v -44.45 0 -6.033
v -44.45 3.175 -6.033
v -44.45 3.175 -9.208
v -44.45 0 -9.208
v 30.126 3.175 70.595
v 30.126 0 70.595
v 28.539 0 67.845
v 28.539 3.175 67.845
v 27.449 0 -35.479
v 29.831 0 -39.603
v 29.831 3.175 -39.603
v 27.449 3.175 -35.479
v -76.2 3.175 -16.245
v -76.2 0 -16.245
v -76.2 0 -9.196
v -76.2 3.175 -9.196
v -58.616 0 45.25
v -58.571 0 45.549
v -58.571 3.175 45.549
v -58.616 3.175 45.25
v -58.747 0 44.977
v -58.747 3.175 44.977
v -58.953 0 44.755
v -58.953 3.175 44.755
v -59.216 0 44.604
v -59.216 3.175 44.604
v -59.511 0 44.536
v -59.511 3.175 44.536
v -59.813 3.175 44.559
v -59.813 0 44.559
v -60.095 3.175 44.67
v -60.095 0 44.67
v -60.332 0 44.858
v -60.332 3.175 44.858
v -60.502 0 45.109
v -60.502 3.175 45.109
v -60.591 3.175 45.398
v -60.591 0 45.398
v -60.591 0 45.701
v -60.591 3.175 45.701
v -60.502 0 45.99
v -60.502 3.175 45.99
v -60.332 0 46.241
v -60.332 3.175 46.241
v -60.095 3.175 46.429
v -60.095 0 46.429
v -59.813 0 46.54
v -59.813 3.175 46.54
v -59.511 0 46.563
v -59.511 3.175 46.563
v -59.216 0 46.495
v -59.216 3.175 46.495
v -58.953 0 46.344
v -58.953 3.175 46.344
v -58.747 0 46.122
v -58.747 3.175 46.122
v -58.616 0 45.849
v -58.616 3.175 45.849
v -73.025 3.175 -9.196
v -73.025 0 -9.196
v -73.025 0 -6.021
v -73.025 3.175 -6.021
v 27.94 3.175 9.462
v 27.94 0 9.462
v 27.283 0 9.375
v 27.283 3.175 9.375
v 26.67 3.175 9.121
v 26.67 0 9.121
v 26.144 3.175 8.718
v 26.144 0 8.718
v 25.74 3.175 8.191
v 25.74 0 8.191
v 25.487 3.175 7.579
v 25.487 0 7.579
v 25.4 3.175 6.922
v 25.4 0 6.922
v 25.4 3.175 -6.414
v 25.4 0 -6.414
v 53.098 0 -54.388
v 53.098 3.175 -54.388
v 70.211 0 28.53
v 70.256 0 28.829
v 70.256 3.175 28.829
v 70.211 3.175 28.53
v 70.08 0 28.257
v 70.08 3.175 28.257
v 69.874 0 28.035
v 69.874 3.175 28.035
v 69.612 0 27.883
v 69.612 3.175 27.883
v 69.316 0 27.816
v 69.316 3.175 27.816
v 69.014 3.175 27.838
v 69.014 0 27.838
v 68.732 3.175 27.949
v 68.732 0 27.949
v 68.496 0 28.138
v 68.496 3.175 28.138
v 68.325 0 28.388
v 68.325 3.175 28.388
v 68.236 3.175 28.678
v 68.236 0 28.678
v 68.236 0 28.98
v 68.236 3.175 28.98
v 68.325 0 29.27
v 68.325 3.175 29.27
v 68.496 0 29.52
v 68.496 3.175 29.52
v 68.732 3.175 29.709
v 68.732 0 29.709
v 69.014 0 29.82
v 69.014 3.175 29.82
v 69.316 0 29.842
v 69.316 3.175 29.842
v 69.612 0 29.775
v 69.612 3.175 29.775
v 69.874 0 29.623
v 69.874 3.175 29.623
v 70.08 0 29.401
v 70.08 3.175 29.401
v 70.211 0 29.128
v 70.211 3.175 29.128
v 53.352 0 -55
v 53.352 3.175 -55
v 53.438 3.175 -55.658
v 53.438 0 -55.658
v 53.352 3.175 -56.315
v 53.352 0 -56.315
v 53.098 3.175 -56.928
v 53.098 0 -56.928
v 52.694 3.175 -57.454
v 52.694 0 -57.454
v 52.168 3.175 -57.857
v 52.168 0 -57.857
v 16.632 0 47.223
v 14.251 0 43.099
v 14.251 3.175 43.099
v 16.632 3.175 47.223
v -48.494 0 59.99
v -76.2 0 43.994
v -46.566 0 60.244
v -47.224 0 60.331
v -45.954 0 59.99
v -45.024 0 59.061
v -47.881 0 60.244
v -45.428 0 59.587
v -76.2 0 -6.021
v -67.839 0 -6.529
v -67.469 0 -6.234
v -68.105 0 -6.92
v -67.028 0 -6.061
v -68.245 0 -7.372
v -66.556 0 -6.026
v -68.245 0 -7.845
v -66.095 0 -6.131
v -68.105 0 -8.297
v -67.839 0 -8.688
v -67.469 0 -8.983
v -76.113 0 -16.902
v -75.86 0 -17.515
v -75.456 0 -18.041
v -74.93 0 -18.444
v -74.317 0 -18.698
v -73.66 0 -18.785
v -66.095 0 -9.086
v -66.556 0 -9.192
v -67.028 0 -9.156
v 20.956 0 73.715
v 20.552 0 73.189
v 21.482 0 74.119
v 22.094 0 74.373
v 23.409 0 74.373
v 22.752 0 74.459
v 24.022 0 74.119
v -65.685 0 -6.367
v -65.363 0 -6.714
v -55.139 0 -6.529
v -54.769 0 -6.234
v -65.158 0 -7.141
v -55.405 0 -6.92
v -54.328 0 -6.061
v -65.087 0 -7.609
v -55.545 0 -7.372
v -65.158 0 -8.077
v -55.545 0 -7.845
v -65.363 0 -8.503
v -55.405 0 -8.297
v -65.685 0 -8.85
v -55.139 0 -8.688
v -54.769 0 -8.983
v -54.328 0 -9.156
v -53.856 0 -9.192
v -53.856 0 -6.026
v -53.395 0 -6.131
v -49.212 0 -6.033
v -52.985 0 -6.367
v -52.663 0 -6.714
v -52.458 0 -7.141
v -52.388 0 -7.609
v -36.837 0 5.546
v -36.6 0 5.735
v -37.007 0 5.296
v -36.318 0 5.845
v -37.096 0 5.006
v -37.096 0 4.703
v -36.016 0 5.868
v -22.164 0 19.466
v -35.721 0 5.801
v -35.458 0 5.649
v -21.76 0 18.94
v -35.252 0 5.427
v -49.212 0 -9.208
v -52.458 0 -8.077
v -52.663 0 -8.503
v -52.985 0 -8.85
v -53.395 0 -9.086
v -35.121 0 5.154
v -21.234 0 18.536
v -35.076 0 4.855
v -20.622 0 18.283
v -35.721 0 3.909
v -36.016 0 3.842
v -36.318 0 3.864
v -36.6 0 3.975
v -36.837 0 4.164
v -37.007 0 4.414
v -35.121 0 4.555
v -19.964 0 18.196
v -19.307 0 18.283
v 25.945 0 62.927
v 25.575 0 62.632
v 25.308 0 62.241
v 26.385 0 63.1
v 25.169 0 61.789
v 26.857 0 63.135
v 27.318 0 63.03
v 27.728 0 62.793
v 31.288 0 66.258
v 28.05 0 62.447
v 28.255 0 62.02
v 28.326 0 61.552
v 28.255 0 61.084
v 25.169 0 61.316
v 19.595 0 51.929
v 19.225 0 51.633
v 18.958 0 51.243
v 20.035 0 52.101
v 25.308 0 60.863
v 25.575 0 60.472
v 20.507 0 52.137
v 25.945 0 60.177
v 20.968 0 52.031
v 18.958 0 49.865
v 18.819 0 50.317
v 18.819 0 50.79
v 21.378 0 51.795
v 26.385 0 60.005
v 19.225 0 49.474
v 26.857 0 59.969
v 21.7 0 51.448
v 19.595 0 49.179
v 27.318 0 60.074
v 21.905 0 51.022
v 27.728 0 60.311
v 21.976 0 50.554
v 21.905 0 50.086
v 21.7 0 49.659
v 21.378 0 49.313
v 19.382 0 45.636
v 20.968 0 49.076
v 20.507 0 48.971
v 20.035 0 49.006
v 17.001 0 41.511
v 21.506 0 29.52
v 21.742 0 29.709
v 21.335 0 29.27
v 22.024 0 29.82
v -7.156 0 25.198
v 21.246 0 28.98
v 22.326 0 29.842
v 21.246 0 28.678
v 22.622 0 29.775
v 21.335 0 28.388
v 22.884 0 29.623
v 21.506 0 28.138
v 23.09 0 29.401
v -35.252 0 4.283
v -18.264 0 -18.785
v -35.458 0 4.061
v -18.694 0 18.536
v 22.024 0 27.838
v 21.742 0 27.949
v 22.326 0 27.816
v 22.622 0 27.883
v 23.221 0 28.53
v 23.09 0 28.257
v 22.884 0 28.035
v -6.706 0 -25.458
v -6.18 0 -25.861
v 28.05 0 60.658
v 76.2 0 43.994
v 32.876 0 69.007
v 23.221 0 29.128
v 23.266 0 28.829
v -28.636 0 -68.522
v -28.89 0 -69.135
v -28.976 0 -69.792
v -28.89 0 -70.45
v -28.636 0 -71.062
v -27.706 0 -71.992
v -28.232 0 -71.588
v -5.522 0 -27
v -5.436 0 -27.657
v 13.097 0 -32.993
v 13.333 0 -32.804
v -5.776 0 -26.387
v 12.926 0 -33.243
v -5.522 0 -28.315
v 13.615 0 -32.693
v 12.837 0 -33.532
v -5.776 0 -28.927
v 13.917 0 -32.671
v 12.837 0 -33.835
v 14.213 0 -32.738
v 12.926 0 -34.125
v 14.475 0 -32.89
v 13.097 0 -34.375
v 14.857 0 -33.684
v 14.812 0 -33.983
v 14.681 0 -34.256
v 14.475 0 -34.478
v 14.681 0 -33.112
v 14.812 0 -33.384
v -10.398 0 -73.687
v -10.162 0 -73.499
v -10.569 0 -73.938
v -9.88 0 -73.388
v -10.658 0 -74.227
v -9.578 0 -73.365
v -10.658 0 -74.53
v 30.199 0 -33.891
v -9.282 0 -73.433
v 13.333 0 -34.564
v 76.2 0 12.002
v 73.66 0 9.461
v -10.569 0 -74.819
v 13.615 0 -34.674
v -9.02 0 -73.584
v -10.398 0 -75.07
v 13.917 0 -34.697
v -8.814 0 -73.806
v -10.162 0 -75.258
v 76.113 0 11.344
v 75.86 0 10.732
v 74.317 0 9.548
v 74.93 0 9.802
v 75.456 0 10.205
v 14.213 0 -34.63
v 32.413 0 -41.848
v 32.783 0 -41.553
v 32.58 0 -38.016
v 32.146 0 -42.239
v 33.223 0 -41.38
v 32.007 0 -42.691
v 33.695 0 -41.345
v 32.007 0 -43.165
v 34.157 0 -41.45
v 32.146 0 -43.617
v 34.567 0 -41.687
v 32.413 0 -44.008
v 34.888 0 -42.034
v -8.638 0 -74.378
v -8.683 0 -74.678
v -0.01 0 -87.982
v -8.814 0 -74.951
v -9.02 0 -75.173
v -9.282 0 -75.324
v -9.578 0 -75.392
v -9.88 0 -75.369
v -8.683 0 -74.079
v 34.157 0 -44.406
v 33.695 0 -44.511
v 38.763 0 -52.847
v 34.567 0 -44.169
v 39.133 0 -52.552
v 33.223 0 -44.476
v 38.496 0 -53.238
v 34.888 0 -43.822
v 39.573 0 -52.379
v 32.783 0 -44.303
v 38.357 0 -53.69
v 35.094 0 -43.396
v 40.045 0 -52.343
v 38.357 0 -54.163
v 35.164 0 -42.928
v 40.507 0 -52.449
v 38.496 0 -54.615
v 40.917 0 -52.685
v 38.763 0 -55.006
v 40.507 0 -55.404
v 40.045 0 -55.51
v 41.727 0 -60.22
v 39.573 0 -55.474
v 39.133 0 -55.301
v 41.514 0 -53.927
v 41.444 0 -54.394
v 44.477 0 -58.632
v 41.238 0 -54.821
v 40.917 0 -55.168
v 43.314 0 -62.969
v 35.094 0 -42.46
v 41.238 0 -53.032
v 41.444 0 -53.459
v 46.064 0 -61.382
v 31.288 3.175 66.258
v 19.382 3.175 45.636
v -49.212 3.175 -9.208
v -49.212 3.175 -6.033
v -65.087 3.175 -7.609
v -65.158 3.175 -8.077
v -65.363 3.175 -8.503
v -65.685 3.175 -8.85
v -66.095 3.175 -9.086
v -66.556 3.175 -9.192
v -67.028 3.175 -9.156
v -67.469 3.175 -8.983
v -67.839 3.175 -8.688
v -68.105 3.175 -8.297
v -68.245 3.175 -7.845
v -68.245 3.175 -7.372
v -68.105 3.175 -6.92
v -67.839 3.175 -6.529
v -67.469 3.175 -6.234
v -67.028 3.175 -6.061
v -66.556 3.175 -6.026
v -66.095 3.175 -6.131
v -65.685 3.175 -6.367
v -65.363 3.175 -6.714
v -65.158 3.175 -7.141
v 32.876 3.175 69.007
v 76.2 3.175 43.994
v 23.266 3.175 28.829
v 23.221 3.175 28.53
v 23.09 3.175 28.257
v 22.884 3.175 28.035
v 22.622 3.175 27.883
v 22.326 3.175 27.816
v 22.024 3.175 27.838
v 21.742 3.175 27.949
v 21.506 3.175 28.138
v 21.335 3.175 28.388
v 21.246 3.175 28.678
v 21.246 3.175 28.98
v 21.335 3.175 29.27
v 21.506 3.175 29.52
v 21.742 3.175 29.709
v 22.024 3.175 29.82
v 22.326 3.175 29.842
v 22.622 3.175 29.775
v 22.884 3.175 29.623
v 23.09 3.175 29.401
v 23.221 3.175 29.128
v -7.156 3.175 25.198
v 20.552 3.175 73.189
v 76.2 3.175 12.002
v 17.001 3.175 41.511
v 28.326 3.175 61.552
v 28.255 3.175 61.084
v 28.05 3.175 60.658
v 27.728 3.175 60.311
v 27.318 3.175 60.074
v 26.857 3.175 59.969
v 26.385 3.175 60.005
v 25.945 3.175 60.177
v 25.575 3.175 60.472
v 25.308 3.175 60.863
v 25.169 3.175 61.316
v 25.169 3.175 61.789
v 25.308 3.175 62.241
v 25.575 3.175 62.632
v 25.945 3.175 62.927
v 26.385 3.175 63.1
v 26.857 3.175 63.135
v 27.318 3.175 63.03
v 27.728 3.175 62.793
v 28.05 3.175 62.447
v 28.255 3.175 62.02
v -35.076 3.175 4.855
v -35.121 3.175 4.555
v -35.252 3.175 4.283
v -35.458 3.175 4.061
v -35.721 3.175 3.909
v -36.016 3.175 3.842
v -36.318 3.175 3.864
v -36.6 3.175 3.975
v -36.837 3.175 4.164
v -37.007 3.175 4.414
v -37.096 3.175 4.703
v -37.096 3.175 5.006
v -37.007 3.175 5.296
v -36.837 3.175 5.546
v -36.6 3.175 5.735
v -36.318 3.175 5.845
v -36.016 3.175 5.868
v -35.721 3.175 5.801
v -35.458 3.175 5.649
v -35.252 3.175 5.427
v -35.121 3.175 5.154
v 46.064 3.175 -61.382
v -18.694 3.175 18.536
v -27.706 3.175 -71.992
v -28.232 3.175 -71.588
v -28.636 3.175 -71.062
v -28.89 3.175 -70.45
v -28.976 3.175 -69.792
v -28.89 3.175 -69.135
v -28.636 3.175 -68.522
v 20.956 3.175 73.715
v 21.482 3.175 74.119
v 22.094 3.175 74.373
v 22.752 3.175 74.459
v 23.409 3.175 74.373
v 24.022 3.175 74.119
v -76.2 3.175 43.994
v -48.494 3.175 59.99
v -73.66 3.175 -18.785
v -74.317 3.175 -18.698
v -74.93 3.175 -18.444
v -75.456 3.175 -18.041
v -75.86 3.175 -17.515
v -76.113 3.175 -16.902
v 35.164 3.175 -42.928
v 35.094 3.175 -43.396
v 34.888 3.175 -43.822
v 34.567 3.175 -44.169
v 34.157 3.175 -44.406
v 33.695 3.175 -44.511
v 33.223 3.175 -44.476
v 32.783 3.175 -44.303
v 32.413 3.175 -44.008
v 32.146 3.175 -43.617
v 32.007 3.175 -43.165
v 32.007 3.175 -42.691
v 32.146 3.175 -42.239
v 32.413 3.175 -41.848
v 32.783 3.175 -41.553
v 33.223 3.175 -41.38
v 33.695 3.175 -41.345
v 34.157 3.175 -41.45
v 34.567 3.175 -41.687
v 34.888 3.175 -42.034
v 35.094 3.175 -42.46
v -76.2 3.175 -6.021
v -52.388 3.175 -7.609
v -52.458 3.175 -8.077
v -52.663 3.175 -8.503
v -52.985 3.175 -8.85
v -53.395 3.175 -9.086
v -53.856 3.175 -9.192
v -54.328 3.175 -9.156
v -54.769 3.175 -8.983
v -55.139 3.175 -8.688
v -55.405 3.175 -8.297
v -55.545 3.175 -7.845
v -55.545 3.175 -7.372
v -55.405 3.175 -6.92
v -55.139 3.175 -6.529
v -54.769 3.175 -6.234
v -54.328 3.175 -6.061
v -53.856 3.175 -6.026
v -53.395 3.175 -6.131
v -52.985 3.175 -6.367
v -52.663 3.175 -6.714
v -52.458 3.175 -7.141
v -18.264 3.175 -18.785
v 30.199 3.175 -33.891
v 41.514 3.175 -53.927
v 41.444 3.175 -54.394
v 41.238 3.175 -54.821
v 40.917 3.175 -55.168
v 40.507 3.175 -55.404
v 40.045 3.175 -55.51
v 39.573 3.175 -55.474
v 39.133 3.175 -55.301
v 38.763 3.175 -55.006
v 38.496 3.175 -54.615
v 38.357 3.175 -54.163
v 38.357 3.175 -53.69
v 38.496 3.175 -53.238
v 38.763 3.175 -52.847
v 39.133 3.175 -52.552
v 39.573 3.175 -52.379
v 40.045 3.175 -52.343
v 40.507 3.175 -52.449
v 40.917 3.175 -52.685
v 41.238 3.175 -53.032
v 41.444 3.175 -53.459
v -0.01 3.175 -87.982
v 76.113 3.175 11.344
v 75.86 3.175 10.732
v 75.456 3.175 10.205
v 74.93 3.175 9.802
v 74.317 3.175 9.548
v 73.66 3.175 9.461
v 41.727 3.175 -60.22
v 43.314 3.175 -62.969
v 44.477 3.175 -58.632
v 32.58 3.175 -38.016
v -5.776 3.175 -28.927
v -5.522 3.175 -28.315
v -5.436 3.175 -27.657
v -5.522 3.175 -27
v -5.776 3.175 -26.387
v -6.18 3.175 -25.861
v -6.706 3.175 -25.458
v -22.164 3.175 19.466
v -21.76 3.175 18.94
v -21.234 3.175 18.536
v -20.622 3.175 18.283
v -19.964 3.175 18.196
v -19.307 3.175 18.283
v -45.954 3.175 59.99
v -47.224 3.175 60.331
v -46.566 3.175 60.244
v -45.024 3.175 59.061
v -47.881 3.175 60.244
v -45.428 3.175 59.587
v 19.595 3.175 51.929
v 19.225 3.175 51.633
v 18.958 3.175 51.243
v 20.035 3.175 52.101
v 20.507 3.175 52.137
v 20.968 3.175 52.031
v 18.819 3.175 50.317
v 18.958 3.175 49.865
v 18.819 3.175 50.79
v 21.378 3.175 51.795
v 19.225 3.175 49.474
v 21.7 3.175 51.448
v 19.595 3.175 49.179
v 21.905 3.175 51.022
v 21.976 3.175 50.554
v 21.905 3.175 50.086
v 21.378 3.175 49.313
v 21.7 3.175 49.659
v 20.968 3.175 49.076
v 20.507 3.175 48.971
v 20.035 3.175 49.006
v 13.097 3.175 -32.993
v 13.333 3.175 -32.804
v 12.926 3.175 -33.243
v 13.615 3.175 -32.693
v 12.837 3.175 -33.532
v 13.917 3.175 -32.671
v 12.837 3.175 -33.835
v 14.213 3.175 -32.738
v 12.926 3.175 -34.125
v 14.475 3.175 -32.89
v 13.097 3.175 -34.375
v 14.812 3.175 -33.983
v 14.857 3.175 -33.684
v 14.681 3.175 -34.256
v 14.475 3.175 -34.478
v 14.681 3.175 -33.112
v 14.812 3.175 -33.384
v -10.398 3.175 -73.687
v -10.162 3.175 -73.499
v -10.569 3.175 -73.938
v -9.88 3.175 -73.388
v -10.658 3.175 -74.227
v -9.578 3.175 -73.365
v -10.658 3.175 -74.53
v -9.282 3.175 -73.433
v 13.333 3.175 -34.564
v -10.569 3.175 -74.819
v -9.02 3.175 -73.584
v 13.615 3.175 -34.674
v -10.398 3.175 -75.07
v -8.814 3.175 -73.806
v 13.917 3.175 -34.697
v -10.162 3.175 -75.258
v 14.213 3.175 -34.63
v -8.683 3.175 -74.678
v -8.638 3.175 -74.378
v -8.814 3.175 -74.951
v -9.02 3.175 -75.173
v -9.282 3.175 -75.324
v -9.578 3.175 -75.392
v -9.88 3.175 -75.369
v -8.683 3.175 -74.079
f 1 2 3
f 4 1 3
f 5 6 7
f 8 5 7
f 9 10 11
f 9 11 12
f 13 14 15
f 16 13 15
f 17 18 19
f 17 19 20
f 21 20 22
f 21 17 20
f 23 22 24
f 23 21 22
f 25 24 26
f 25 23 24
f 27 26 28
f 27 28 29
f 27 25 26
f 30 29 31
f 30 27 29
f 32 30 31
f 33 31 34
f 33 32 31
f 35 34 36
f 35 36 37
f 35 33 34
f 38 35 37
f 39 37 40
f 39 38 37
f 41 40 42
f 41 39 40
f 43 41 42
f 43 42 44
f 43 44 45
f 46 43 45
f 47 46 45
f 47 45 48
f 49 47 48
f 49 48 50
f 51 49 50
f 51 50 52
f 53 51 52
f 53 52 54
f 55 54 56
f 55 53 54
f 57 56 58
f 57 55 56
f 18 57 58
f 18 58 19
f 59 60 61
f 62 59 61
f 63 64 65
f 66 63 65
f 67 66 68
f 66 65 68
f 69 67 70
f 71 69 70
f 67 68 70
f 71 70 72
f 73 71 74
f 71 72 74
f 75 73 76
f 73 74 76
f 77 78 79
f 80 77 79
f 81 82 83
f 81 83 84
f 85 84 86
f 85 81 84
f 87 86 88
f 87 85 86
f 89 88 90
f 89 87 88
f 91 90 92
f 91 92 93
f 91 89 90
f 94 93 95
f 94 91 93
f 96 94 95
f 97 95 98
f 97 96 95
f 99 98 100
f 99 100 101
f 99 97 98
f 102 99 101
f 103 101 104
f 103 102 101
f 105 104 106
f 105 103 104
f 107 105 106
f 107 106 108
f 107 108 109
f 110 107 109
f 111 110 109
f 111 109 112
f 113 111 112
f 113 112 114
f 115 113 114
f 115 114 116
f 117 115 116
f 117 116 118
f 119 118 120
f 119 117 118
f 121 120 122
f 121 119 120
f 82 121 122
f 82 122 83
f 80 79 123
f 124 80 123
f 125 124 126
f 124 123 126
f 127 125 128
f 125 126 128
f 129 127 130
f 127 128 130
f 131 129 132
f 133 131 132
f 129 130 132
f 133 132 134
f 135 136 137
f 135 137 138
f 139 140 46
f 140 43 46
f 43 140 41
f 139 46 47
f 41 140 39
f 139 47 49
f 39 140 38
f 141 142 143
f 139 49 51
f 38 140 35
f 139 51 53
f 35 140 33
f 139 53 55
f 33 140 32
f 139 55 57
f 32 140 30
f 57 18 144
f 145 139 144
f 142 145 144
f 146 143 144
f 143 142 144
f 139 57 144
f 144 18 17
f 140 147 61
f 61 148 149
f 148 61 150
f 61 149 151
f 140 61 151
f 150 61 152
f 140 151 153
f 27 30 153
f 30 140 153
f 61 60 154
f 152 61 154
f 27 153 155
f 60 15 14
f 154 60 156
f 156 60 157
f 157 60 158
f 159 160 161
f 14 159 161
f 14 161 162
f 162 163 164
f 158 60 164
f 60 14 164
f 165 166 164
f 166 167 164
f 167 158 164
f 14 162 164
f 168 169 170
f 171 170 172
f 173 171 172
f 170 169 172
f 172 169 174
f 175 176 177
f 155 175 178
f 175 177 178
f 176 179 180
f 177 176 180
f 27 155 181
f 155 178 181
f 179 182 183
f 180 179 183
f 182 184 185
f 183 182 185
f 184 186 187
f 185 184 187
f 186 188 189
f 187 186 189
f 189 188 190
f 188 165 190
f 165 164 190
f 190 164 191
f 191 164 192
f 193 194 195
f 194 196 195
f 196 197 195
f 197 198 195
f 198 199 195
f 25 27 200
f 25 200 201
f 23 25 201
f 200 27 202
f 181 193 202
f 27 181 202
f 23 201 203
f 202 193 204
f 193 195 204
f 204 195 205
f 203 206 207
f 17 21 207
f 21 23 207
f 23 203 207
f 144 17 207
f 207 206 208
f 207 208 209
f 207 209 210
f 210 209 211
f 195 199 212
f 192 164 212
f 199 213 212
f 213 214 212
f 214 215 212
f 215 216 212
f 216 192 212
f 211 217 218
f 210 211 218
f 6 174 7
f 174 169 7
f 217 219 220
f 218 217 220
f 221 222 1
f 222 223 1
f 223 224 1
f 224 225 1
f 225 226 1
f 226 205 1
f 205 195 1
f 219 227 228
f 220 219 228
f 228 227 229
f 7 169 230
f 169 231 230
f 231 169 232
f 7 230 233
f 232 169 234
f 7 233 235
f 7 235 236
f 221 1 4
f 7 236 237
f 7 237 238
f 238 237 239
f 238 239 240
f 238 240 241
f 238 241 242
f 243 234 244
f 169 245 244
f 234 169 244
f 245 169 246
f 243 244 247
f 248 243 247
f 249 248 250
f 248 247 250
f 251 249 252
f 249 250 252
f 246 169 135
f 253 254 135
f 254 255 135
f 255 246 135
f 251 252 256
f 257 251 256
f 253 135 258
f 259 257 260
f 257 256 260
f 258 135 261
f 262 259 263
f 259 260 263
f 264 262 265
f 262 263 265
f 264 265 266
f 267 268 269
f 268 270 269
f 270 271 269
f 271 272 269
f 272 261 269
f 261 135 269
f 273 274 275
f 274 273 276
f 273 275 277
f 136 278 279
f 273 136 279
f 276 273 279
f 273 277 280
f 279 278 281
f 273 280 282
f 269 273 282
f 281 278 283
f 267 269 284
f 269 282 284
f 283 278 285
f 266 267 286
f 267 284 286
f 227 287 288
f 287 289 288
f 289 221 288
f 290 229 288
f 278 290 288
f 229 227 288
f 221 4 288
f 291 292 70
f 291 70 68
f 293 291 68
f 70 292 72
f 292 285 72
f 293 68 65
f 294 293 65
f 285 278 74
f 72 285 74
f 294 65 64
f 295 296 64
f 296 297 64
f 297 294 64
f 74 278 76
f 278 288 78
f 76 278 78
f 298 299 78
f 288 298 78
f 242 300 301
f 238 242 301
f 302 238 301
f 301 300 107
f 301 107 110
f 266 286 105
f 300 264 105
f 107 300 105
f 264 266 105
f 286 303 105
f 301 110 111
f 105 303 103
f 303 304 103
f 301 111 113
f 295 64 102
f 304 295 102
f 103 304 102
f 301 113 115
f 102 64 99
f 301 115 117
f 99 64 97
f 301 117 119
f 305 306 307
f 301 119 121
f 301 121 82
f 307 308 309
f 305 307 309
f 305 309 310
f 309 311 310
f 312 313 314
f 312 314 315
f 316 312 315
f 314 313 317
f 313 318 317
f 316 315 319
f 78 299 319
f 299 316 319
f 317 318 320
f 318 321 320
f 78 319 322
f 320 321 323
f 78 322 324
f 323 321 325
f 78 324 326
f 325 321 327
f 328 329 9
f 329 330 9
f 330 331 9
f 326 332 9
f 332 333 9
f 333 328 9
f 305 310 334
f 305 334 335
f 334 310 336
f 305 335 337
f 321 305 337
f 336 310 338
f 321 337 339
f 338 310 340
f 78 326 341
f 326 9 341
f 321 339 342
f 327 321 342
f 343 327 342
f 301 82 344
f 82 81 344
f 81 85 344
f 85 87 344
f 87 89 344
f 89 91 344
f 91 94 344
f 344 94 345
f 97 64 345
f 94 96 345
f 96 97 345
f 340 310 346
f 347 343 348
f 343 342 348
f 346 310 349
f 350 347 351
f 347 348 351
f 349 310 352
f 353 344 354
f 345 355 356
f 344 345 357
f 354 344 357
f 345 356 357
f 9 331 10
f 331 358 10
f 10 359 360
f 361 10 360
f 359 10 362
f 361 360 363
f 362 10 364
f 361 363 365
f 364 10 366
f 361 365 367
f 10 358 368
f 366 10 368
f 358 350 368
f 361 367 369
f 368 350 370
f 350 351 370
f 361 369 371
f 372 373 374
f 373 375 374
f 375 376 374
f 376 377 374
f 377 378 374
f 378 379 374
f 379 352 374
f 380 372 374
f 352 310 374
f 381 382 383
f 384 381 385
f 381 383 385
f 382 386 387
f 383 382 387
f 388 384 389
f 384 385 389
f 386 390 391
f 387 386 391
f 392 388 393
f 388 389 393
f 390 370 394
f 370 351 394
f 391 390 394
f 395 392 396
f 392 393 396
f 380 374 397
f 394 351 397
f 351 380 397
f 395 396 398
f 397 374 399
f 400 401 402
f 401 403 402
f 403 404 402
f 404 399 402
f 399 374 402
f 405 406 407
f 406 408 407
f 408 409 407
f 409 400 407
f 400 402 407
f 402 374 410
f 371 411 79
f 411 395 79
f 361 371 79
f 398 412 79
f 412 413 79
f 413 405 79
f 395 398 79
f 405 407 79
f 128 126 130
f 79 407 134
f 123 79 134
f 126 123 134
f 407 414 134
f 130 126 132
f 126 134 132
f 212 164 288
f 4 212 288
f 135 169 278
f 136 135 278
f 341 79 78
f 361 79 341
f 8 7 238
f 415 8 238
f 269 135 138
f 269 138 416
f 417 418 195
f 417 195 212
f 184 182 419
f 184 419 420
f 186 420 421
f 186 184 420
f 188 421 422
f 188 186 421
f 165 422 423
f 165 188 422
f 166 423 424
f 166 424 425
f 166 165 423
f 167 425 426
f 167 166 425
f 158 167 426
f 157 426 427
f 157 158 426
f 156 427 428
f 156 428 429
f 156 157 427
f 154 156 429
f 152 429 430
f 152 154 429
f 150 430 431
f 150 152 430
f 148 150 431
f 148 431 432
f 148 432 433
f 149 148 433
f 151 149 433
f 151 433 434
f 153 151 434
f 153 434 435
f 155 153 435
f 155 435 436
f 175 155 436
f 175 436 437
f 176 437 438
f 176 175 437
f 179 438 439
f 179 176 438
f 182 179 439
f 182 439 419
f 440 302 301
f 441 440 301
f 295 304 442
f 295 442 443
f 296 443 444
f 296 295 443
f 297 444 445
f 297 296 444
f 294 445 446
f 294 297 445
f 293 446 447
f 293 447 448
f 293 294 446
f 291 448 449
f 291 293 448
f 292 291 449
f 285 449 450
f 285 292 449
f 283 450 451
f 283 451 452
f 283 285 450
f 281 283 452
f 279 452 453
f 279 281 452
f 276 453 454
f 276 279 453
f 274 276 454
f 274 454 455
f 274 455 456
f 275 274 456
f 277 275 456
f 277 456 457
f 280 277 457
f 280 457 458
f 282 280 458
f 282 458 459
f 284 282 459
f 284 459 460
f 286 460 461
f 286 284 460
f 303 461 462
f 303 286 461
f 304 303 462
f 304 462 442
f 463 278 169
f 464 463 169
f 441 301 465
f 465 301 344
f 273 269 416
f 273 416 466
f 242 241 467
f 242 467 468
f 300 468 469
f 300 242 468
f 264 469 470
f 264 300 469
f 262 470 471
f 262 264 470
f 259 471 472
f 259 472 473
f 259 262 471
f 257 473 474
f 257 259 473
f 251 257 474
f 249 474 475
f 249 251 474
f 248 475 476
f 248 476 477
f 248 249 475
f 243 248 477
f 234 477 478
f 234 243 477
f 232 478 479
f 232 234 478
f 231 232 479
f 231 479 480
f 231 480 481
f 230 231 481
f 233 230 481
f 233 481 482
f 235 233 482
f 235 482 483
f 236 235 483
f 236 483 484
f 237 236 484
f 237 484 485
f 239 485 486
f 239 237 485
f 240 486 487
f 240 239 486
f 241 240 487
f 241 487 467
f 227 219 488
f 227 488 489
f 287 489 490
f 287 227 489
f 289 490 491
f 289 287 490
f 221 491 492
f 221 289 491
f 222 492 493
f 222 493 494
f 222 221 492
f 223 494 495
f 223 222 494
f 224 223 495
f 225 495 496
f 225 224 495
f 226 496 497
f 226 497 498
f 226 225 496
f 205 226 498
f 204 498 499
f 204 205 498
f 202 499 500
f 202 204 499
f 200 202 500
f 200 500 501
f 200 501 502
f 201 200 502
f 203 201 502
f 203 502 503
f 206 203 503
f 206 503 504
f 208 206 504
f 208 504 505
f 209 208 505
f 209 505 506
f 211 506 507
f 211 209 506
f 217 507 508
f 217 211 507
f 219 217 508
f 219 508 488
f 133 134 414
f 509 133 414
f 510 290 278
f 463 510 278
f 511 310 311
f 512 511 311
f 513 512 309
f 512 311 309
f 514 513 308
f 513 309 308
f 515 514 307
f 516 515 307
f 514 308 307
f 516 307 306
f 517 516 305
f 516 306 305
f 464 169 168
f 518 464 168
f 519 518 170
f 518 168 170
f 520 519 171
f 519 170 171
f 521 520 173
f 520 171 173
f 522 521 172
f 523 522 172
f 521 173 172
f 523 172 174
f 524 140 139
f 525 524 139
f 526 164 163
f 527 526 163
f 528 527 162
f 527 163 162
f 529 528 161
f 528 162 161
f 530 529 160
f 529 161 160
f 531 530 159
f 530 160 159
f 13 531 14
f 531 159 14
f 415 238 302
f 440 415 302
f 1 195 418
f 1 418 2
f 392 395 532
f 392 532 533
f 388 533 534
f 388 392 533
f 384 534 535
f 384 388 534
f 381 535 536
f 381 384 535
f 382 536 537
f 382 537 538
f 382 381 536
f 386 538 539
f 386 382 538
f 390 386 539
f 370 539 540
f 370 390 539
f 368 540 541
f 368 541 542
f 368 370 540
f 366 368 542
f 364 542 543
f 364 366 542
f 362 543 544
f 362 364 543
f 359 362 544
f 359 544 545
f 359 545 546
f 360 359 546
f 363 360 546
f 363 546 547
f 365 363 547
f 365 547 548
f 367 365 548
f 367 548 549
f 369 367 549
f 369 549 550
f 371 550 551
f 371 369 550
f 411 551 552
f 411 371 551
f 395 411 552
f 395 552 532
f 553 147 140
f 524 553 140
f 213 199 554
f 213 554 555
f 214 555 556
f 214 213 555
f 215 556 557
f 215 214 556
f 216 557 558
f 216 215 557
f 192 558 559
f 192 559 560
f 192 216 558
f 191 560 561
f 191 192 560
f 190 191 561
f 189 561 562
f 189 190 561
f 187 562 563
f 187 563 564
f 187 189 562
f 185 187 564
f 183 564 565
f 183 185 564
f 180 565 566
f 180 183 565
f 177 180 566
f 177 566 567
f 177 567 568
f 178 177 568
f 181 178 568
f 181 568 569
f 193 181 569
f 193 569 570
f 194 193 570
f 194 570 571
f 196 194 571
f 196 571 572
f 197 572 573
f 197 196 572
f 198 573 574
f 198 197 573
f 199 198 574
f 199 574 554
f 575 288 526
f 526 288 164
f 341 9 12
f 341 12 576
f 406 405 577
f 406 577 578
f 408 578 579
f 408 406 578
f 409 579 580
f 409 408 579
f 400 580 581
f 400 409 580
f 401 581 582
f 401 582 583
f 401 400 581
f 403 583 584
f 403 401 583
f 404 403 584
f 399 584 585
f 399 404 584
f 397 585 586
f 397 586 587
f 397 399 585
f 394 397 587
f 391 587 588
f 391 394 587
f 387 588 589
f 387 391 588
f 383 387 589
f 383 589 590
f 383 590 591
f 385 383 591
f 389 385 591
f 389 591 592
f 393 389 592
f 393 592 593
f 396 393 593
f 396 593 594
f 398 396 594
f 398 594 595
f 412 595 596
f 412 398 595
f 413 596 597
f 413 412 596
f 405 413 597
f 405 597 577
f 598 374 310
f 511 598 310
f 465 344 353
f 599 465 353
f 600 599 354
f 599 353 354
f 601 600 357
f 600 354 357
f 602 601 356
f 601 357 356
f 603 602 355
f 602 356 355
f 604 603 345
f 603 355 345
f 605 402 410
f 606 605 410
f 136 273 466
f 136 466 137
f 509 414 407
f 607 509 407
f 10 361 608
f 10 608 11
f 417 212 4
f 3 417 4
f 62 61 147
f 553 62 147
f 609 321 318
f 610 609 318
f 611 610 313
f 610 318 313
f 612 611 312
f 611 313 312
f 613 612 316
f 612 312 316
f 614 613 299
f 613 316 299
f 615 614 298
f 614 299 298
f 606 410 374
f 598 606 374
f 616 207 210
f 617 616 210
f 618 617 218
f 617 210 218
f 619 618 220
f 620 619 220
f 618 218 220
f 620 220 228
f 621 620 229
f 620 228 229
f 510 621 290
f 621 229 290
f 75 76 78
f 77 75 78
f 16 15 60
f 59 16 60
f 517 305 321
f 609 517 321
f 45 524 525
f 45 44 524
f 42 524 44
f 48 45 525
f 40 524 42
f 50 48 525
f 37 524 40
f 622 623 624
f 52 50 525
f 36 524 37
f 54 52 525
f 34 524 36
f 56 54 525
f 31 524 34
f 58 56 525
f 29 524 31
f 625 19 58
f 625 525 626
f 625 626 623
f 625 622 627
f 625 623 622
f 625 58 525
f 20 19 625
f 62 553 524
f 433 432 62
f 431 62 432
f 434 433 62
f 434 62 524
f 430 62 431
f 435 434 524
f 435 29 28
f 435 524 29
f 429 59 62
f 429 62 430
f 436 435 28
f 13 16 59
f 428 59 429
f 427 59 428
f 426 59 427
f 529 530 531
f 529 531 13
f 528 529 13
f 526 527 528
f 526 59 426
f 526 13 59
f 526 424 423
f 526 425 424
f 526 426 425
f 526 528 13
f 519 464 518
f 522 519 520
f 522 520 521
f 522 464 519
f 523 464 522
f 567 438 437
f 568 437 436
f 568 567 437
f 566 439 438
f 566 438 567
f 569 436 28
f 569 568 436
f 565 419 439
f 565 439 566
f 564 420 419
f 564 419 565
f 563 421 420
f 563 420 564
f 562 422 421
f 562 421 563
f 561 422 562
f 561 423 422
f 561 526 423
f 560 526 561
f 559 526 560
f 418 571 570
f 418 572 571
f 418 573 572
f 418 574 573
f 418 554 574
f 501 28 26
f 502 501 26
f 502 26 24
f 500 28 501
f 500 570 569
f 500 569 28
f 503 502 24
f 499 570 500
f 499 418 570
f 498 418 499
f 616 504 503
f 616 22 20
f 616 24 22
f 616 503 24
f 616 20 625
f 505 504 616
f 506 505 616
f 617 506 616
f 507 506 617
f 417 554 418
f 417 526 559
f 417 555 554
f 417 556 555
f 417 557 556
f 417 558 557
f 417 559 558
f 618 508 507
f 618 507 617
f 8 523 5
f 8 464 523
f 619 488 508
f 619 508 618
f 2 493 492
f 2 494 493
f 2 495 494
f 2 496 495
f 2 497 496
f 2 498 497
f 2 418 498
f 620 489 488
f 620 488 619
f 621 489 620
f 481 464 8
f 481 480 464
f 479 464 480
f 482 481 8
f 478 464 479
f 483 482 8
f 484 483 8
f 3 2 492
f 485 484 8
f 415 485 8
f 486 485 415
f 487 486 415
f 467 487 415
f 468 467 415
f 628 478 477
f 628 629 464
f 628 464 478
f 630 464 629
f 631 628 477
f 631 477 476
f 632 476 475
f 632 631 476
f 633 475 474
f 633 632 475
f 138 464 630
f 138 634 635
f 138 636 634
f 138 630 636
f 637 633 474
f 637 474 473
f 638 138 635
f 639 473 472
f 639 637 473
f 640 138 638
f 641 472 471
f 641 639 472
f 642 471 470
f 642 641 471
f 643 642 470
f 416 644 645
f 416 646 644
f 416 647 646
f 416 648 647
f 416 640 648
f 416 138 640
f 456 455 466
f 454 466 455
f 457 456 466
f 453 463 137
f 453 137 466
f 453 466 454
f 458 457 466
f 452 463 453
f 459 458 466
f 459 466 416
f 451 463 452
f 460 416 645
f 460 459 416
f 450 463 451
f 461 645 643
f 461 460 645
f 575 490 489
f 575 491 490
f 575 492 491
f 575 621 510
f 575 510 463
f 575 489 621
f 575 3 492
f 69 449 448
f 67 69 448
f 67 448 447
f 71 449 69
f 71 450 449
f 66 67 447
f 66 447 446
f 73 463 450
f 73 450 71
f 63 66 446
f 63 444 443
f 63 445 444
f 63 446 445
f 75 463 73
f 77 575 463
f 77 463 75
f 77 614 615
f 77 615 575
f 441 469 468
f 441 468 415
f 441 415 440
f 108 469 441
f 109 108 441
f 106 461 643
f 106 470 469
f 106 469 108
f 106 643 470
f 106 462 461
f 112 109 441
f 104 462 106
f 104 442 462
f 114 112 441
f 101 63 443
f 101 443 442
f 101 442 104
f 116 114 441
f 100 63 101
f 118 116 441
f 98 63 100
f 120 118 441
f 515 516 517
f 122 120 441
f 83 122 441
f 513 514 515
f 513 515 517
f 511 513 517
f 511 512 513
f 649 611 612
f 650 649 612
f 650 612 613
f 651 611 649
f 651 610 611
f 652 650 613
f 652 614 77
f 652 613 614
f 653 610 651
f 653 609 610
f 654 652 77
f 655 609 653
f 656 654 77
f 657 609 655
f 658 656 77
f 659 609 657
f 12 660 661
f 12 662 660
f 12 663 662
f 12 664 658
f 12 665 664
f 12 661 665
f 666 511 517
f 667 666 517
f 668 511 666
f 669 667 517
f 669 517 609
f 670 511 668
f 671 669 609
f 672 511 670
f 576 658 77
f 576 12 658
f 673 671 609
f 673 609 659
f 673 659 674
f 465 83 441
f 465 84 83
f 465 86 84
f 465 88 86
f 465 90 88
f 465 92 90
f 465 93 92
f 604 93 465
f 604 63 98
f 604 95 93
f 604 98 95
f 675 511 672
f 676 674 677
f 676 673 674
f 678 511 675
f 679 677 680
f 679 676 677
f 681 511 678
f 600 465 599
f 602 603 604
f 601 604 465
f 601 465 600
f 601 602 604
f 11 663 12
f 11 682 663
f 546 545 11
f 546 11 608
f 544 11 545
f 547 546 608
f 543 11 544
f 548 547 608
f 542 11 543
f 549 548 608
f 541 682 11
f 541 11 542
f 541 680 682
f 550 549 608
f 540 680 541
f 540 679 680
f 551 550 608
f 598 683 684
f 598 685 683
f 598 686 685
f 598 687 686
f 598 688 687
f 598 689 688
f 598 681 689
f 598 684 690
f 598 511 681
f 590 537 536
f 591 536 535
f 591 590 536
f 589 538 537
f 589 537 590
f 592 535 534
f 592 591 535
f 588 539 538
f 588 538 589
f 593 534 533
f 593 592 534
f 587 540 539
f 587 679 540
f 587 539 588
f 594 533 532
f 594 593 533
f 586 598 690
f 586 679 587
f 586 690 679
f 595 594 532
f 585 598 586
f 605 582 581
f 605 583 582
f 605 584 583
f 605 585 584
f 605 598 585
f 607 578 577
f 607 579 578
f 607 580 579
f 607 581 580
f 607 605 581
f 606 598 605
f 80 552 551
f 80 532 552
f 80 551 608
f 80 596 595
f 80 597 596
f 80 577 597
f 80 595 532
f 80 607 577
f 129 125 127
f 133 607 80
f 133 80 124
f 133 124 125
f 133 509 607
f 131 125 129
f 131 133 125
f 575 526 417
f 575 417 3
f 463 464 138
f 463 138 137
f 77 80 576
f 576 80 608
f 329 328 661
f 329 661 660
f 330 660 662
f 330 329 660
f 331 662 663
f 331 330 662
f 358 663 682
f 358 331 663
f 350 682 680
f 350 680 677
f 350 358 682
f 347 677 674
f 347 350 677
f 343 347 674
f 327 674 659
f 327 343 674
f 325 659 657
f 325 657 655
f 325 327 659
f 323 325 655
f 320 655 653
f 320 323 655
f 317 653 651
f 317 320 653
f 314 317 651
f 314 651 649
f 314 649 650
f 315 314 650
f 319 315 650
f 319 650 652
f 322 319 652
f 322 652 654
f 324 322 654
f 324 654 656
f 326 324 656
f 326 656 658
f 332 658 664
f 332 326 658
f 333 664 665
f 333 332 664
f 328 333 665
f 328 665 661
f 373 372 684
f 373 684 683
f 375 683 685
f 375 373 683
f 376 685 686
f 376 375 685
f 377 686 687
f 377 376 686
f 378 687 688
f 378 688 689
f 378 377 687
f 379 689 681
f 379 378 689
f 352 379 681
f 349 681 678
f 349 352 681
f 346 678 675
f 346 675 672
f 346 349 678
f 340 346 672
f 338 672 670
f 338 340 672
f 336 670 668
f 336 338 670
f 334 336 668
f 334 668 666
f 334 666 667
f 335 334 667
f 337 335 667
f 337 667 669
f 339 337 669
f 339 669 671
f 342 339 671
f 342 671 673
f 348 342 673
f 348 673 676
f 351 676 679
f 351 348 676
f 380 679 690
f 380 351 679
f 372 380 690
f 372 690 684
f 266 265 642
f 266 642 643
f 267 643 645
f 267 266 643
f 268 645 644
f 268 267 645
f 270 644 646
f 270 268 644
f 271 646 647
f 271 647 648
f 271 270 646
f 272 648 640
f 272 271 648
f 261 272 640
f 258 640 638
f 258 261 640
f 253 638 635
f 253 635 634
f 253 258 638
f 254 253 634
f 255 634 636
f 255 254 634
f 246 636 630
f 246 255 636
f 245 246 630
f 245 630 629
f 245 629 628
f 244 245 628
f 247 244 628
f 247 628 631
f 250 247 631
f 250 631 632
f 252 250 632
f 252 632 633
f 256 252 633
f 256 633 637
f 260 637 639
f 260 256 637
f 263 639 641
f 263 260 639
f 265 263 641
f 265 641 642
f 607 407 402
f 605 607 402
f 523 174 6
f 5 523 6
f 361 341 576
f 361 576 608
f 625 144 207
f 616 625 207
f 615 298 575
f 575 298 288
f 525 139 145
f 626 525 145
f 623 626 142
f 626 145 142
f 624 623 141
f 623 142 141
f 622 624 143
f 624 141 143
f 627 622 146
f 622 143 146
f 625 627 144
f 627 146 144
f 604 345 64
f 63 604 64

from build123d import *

# Parameters (mm, degrees)
SKETCH1_R           = 1.016
SKETCH1_R_2         = 1.5875
SKETCH1_W           = 4.7625
SKETCH1_H           = 3.175
BOSS_EXTRUDE2_DEPTH = 3.175


with BuildPart() as part:
    # Sketch1 → Boss-Extrude2 (new body)
    with BuildSketch(Plane(origin=(0, 0, 0), x_dir=(1, 0, 0), z_dir=(0, 1, 0))):
        with BuildLine():
            Line((-18.264134833, 18.784590512), (-73.66, 18.784590512))
            ThreePointArc((-73.66, 18.784590512), (-75.456051224, 18.040641736), (-76.2, 16.244590512))
            Line((-76.2, 16.244590512), (-76.2, 9.196090512))
            Line((-76.2, 9.196090512), (-73.025, 9.196090512))
            Line((-73.025, 9.196090512), (-73.025, 6.021090512))
            Line((-73.025, 6.021090512), (-76.2, 6.021090512))
            Line((-76.2, 6.021090512), (-76.2, -43.994090512))
            Line((-76.2, -43.994090512), (-48.493603884, -59.990385768))
            ThreePointArc((-48.493603884, -59.990385768), (-46.566203509, -60.244132842), (-45.023899358, -59.060681243))
            Line((-45.023899358, -59.060681243), (-22.163899358, -19.465999782))
            ThreePointArc((-22.163899358, -19.465999782), (-20.621595207, -18.282548183), (-18.694194832, -18.536295256))
            Line((-18.694194832, -18.536295256), (-7.155626979, -25.198090512))
            Line((-7.155626979, -25.198090512), (20.55218651, -73.189431243))
            ThreePointArc((20.55218651, -73.189431243), (22.094490662, -74.372882842), (24.021891036, -74.119135768))
            Line((24.021891036, -74.119135768), (30.126071095, -70.594885768))
            Line((30.126071095, -70.594885768), (28.538571095, -67.845255111))
            Line((28.538571095, -67.845255111), (31.288201752, -66.257755111))
            Line((31.288201752, -66.257755111), (32.875701752, -69.007385768))
            Line((32.875701752, -69.007385768), (76.2, -43.994090512))
            Line((76.2, -43.994090512), (76.2, -12.0015))
            ThreePointArc((76.2, -12.0015), (75.456051224, -10.205448776), (73.66, -9.4615))
            Line((73.66, -9.4615), (27.94, -9.4615))
            ThreePointArc((27.94, -9.4615), (26.143948776, -8.717551224), (25.4, -6.9215))
            Line((25.4, -6.9215), (25.4, 6.4135))
            Line((25.4, 6.4135), (53.097932583, 54.387726499))
            ThreePointArc((53.097932583, 54.387726499), (53.351679656, 56.315126873), (52.168228058, 57.857431024))
            Line((52.168228058, 57.857431024), (46.064047999, 61.381681024))
            Line((46.064047999, 61.381681024), (44.476547999, 58.632050367))
            Line((44.476547999, 58.632050367), (41.726917342, 60.219550367))
            Line((41.726917342, 60.219550367), (43.314417342, 62.969181024))
            Line((43.314417342, 62.969181024), (-0.009880906, 87.982476281))
            Line((-0.009880906, 87.982476281), (-27.706396116, 71.991885768))
            ThreePointArc((-27.706396116, 71.991885768), (-28.889847715, 70.449581617), (-28.636100642, 68.522181243))
            Line((-28.636100642, 68.522181243), (-5.776100642, 28.927499782))
            ThreePointArc((-5.776100642, 28.927499782), (-5.522353569, 27.000099407), (-6.705805168, 25.457795256))
            Line((-6.705805168, 25.457795256), (-18.264134833, 18.784590512))
        make_face()
        with Locations((69.2404, -28.829)):
            Circle(SKETCH1_R, mode=Mode.SUBTRACT)
        with Locations((-59.586846366, -45.549445368)):
            Circle(SKETCH1_R, mode=Mode.SUBTRACT)
        with Locations((-9.653553634, 74.378445368)):
            Circle(SKETCH1_R, mode=Mode.SUBTRACT)
        with Locations((22.2504, -28.829)):
            Circle(SKETCH1_R, mode=Mode.SUBTRACT)
        with Locations((-36.091846366, -4.854911644)):
            Circle(SKETCH1_R, mode=Mode.SUBTRACT)
        with Locations((13.841446366, 33.683911644)):
            Circle(SKETCH1_R, mode=Mode.SUBTRACT)
        with Locations((26.738386423, -61.552243797)):
            Circle(SKETCH1_R_2, mode=Mode.SUBTRACT)
        with Locations((20.388386423, -50.553721169)):
            Circle(SKETCH1_R_2, mode=Mode.SUBTRACT)
        with Locations((-53.975, 7.608590512)):
            Circle(SKETCH1_R_2, mode=Mode.SUBTRACT)
        with Locations((-66.675, 7.608590512)):
            Circle(SKETCH1_R_2, mode=Mode.SUBTRACT)
        with Locations((33.576732671, 42.928016425)):
            Circle(SKETCH1_R_2, mode=Mode.SUBTRACT)
        with Locations((39.926732671, 53.926539053)):
            Circle(SKETCH1_R_2, mode=Mode.SUBTRACT)
        Polygon((14.251071095, -43.098579198), (16.632321095, -47.223025184), (19.381951752, -45.635525184), (17.000701752, -41.511079198), align=None, mode=Mode.SUBTRACT)
        with Locations((-46.83125, 7.62)):
            Rectangle(SKETCH1_W, SKETCH1_H, mode=Mode.SUBTRACT)
        Polygon((29.830548248, 39.603025184), (27.449298248, 35.478579198), (30.198928905, 33.891079198), (32.580178905, 38.015525184), align=None, mode=Mode.SUBTRACT)
    extrude(amount=BOSS_EXTRUDE2_DEPTH)


solid = part.part
